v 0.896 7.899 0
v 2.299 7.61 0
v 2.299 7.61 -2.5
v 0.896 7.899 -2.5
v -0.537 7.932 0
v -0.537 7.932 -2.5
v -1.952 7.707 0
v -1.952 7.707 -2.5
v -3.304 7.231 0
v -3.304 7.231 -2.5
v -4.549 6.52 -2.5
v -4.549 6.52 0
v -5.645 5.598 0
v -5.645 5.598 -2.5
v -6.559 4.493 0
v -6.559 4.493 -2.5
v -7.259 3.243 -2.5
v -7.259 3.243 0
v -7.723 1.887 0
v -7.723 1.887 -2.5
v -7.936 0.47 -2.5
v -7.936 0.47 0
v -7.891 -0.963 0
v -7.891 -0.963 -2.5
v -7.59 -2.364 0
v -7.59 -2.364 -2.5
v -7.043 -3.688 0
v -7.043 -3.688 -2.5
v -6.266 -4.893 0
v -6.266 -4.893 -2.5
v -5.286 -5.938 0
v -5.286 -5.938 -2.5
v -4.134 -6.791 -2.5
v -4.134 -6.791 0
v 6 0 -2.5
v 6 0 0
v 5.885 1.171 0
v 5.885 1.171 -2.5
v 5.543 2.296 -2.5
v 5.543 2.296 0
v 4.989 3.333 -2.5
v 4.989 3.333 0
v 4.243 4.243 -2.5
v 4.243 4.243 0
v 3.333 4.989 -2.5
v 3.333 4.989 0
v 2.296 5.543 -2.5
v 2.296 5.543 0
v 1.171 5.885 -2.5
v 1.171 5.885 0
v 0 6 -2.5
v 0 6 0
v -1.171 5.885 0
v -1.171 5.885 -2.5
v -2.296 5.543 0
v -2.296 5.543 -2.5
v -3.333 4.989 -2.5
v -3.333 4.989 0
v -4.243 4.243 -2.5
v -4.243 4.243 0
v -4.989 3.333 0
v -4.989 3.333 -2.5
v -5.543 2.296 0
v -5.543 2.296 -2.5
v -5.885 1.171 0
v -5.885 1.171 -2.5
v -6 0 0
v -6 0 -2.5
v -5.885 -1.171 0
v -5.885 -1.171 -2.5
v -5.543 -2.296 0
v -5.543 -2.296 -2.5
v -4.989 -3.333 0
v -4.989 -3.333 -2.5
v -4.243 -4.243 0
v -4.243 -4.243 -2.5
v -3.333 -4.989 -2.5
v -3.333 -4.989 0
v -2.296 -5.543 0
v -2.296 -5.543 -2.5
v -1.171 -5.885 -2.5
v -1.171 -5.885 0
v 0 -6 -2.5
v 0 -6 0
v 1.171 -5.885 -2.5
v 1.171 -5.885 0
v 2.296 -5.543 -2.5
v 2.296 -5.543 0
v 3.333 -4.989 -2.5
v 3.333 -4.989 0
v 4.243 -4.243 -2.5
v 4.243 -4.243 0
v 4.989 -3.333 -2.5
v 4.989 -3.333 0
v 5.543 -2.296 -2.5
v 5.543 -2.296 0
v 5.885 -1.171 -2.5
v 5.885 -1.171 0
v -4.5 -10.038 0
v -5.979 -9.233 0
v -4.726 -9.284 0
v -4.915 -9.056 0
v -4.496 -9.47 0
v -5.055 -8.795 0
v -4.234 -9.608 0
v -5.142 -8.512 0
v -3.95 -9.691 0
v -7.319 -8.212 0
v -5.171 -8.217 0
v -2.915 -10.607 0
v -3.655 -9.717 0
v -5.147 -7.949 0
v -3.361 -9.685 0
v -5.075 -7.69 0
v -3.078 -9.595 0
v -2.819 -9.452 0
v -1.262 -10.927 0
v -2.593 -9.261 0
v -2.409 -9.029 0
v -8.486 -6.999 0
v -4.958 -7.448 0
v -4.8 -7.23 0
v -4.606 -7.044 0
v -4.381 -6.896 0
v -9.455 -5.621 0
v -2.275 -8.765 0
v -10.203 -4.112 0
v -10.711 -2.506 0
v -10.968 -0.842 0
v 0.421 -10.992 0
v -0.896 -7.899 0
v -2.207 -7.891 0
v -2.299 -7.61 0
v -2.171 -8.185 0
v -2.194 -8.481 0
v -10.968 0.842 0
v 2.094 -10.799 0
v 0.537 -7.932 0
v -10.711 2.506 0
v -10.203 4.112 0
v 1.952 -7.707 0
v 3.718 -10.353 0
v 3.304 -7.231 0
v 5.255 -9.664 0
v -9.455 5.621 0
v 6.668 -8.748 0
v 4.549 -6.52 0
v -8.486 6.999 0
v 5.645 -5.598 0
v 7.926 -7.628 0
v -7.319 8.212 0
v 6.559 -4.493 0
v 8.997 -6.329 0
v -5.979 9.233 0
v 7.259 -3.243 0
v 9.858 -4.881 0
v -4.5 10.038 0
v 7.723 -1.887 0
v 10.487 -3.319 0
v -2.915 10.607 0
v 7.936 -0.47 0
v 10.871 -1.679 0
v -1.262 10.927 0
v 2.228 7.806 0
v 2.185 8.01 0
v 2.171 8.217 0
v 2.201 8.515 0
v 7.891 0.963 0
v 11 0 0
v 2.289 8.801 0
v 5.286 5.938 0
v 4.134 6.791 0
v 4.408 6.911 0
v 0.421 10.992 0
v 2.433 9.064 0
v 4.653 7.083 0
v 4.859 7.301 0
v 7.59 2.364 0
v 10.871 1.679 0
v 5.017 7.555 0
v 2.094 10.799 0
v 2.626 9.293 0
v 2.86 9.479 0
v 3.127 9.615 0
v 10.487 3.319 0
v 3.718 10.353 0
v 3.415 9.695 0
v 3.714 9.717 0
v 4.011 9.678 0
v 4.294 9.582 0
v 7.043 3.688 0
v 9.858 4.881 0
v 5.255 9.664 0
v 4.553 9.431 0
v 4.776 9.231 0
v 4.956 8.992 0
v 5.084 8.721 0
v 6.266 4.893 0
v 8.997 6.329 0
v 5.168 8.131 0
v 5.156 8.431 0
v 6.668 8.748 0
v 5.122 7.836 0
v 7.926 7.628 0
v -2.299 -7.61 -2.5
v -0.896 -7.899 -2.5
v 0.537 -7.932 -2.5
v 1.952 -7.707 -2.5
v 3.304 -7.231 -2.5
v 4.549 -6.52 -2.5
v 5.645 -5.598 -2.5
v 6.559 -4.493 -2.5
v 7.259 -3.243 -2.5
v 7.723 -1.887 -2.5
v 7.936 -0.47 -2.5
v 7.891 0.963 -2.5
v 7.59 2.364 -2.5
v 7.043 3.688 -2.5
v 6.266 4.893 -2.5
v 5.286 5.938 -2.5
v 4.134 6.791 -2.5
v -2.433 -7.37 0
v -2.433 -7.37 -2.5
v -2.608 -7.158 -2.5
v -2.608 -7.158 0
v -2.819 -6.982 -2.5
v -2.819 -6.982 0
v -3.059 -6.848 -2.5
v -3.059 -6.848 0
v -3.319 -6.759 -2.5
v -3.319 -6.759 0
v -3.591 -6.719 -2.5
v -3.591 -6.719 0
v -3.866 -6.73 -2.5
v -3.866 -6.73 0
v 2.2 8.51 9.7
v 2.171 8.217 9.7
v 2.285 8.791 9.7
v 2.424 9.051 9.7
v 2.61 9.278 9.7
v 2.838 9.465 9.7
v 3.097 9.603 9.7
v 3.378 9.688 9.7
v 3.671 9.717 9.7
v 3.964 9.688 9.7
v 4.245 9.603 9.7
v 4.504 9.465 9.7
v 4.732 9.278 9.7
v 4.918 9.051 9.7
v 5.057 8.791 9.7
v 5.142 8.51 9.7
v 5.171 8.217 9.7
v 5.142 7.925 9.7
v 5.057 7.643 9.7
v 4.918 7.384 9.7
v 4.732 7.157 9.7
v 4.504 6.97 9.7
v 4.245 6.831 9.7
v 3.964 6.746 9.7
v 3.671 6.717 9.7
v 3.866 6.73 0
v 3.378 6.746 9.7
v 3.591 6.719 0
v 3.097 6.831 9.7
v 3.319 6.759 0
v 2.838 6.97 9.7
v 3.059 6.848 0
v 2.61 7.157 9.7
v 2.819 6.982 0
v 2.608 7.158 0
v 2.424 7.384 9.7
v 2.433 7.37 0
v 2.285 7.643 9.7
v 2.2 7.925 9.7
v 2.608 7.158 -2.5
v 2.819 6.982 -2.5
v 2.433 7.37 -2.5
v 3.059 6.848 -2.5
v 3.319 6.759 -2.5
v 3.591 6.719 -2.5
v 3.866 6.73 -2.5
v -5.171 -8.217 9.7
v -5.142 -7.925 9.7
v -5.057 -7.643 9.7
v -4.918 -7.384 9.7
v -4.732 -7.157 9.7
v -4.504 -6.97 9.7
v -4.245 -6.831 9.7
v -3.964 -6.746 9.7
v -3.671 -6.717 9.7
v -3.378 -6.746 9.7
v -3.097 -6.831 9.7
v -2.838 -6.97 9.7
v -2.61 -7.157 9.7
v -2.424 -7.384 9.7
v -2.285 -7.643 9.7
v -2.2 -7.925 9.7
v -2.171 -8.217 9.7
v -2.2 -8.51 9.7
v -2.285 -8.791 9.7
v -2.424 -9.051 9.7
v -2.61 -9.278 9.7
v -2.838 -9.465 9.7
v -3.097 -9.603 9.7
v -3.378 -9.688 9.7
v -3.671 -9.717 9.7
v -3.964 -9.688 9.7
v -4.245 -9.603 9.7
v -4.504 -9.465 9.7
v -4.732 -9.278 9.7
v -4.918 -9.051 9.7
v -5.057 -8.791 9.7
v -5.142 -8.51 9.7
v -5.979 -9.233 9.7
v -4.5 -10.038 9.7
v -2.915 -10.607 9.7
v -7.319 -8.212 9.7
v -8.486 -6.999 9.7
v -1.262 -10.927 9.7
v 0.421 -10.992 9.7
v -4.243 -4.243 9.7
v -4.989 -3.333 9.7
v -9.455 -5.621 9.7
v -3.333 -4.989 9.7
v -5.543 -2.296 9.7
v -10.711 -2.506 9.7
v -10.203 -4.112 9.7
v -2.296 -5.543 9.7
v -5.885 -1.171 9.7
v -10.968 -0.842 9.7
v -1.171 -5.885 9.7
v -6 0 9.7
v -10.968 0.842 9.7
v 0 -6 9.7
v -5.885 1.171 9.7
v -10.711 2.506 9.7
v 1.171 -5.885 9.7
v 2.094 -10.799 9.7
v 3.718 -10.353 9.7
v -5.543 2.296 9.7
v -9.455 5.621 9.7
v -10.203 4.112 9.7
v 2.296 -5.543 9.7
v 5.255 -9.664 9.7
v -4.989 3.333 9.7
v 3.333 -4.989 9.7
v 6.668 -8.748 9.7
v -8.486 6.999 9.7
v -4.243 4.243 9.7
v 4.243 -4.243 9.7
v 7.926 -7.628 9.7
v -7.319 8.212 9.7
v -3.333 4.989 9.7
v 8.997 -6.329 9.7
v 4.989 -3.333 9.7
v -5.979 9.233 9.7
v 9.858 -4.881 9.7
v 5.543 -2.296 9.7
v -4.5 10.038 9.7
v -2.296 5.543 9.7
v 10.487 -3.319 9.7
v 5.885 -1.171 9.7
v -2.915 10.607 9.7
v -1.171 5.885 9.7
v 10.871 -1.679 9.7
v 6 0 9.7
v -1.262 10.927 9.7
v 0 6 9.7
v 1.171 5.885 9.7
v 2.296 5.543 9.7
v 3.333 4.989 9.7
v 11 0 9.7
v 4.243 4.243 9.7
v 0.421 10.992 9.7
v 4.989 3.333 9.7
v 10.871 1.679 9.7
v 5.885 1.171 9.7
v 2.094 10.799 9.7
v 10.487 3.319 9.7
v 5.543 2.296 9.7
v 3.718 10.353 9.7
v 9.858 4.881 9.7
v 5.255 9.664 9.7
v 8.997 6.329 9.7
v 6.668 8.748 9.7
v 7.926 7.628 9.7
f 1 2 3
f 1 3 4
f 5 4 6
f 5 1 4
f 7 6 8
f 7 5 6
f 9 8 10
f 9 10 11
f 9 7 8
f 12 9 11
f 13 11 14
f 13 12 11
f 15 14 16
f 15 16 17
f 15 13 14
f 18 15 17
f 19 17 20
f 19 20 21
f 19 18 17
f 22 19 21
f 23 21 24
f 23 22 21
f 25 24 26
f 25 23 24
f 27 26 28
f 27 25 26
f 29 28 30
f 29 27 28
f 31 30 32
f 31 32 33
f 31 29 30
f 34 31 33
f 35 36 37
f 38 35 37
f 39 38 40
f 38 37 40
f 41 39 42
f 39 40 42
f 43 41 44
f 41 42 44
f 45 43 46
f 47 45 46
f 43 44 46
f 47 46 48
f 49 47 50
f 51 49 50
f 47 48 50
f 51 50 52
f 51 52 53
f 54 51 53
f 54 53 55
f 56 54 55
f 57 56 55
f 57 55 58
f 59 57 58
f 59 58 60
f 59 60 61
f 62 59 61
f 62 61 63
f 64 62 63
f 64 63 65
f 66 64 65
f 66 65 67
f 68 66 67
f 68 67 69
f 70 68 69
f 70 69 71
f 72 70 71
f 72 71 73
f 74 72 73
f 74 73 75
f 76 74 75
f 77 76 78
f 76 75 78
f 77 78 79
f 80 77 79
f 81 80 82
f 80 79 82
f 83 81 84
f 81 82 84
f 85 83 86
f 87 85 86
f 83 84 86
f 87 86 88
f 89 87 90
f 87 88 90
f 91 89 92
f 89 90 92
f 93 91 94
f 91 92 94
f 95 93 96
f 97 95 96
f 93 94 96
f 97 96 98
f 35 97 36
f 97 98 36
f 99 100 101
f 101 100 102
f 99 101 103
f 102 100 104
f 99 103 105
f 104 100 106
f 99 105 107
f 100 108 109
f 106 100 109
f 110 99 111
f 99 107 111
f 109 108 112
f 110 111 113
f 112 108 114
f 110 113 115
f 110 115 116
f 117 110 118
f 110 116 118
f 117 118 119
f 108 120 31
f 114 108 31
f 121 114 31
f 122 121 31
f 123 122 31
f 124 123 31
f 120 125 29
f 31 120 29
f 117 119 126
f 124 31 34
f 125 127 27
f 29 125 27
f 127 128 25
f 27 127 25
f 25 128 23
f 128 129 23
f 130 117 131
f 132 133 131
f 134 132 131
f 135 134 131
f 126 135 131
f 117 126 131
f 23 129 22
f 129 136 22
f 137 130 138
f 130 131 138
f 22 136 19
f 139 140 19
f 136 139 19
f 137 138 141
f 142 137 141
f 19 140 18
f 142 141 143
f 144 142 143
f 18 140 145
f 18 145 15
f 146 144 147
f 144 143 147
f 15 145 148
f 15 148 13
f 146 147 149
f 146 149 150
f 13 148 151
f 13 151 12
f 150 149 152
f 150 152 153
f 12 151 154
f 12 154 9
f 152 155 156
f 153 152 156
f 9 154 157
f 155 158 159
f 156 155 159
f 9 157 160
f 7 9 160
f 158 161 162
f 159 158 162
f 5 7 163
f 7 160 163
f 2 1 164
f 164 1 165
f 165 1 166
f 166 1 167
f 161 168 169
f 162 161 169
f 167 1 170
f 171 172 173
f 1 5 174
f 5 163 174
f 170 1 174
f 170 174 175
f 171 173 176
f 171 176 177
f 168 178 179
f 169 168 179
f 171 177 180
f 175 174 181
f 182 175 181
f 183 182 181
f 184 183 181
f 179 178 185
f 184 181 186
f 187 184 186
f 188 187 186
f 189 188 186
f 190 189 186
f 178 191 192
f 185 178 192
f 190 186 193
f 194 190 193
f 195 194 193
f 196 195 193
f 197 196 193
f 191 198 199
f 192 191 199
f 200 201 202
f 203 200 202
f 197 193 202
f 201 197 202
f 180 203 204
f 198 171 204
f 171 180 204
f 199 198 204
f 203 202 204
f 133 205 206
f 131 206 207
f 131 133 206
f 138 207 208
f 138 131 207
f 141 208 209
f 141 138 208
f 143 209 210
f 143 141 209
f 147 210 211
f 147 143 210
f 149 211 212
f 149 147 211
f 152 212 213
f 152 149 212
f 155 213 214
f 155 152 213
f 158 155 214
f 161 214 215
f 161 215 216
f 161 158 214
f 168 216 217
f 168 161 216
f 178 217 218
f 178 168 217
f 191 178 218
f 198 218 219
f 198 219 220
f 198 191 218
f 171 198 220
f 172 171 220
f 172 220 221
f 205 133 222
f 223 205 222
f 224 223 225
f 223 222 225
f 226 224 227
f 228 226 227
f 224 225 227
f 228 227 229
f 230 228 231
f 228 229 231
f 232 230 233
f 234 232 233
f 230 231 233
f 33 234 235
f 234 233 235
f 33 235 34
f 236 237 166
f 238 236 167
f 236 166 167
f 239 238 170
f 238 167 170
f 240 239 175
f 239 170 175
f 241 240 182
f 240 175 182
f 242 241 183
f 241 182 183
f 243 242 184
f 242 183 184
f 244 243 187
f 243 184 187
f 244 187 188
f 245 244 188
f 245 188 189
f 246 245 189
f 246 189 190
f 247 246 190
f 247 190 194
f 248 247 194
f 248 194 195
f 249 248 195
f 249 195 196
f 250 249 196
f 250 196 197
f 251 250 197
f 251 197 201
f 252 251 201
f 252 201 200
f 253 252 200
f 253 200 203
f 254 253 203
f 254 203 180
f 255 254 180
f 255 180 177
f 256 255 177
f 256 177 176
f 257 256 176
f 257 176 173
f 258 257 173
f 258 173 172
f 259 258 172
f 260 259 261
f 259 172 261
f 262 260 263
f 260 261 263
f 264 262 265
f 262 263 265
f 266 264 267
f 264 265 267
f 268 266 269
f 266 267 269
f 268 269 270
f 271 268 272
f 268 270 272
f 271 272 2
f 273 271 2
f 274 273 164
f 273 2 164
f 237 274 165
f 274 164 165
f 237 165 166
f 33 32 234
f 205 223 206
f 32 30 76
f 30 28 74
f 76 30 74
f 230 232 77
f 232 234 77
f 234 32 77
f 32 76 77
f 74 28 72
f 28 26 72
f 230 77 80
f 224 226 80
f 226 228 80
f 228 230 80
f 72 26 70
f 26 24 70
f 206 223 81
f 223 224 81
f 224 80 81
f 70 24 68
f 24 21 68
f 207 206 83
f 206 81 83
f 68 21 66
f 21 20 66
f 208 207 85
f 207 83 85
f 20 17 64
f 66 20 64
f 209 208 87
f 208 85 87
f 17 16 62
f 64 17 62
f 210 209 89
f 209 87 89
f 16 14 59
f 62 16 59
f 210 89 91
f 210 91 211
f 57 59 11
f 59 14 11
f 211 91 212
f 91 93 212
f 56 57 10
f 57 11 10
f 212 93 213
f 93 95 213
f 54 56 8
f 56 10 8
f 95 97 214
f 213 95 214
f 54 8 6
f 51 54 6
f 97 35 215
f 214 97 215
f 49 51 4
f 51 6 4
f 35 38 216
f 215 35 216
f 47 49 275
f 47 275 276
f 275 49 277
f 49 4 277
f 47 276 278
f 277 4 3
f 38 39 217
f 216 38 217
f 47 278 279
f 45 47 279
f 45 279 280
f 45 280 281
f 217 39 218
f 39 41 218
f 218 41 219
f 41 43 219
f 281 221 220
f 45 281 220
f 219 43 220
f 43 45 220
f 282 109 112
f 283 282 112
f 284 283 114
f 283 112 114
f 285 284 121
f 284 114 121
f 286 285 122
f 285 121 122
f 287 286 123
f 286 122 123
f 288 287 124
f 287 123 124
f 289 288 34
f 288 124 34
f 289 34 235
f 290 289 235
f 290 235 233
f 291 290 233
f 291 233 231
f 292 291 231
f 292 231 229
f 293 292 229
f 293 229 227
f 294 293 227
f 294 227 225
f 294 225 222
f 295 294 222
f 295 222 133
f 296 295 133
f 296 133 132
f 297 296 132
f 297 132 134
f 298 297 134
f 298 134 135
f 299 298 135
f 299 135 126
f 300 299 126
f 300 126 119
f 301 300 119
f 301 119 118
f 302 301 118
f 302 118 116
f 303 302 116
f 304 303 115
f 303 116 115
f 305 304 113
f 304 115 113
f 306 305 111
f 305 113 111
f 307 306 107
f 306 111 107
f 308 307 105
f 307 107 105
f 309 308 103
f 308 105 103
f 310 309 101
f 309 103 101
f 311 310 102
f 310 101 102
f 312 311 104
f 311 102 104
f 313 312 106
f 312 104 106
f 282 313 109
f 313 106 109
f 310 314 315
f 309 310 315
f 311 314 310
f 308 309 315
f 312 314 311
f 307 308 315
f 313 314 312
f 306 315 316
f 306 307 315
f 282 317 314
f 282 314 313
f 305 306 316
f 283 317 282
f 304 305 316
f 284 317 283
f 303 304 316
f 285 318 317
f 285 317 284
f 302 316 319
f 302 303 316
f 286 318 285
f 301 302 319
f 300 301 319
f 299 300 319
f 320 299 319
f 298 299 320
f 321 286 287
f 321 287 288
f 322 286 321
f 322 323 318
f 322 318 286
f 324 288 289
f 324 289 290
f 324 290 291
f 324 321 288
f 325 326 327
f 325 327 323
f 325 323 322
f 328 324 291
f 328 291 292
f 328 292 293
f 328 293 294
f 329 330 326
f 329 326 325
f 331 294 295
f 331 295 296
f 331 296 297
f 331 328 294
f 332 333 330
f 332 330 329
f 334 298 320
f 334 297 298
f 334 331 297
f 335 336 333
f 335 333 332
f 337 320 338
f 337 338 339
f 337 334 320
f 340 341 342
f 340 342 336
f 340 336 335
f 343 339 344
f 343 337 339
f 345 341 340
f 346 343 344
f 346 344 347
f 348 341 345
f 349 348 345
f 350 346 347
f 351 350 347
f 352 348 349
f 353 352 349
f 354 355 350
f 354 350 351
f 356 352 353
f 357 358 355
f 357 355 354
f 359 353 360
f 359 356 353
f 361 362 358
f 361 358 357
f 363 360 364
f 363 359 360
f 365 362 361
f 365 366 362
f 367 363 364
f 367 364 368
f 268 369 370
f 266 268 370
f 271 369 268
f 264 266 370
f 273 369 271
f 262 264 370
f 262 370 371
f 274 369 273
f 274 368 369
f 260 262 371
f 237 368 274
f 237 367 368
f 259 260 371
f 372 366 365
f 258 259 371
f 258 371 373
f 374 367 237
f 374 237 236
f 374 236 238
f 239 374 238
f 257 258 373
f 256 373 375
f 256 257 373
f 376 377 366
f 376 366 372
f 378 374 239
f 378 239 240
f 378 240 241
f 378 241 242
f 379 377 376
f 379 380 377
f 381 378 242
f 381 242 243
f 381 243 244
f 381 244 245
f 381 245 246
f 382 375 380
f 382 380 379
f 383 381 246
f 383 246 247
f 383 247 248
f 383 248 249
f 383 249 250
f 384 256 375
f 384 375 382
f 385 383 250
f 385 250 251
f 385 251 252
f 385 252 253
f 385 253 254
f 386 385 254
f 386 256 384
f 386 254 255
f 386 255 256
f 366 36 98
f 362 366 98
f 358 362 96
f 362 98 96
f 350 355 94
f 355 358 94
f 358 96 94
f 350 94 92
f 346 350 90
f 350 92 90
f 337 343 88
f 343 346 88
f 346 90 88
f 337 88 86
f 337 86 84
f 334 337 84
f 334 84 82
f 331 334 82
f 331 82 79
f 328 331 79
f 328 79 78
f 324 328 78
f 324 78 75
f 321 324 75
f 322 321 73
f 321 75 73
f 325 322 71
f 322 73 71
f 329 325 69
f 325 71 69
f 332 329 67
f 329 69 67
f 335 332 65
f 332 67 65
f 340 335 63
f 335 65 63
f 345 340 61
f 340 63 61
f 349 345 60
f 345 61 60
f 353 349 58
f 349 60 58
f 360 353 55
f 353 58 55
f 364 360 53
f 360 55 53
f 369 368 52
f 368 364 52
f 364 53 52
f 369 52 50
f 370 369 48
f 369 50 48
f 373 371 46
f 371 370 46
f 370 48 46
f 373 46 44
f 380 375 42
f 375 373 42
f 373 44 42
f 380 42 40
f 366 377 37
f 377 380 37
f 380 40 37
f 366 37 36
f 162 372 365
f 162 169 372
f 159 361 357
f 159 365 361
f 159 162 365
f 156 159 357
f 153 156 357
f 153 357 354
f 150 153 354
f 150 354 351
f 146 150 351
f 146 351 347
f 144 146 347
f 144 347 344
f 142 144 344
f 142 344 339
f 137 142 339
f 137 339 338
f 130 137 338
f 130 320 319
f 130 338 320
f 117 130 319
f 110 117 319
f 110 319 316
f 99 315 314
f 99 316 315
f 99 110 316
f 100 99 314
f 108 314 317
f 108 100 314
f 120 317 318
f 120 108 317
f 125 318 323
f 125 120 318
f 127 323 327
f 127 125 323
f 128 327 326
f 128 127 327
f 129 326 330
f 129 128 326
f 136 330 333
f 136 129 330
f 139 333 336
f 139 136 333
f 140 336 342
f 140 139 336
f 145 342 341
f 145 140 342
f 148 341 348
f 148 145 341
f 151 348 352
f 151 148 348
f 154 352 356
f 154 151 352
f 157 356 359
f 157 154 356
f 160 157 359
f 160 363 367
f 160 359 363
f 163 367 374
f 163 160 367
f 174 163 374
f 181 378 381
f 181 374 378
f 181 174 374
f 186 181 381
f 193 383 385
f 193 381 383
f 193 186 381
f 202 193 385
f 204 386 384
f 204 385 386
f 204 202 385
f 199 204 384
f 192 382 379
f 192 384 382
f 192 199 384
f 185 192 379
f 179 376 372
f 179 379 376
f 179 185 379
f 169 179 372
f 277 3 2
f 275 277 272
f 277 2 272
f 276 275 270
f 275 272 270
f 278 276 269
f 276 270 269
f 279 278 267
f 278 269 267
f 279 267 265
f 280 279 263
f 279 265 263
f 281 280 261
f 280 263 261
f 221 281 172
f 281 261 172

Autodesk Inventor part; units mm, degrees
ref_plane "YZ Plane" through (0, 0, 0) normal (1, 0, 0) x (0, 1, 0)
ref_plane "XZ Plane" through (0, 0, 0) normal (0, 1, 0) x (-1, 0, 0)
ref_plane "XY Plane" through (0, 0, 0) normal (0, 0, 1) x (1, 0, 0)
sketch "Эскиз1" plane through (0, 0, 0) normal (0, 0, 1) x (1, 0, 0)
  circle A0 centre (0, 0) radius 7.95
  circle A1 centre (0, 0) radius 11
  circle A2 centre (0, 0) radius 6
  dimension "d0" = 15.9
  dimension "d1" = 22
  dimension "d2" = 12
extrude "Выдавливание1" add sketch "Эскиз1" against normal blind 2.5 contours A0
extrude "Выдавливание2" add sketch "Эскиз1" along normal blind 9.7 contours A0 | A1
sketch "Эскиз2" plane through (0, 0, 0) normal (0, 0, -1) x (-1, 0, 0)
  circle A0 centre (3.6709, -8.2173) radius 1.5 projected
  circle A1 centre (-3.6709, 8.2173) radius 1.5 projected
  circle A2 centre (3.6709, -8.2173) radius 1.5
  circle A3 centre (-3.6709, 8.2173) radius 1.5
  point P0 (0, 0)
  dimension "d7" = 3
  dimension "d8" = 3
extrude "Выдавливание3" cut sketch "Эскиз2" along normal mid plane 30
properties part number "factory barrier adapter"
